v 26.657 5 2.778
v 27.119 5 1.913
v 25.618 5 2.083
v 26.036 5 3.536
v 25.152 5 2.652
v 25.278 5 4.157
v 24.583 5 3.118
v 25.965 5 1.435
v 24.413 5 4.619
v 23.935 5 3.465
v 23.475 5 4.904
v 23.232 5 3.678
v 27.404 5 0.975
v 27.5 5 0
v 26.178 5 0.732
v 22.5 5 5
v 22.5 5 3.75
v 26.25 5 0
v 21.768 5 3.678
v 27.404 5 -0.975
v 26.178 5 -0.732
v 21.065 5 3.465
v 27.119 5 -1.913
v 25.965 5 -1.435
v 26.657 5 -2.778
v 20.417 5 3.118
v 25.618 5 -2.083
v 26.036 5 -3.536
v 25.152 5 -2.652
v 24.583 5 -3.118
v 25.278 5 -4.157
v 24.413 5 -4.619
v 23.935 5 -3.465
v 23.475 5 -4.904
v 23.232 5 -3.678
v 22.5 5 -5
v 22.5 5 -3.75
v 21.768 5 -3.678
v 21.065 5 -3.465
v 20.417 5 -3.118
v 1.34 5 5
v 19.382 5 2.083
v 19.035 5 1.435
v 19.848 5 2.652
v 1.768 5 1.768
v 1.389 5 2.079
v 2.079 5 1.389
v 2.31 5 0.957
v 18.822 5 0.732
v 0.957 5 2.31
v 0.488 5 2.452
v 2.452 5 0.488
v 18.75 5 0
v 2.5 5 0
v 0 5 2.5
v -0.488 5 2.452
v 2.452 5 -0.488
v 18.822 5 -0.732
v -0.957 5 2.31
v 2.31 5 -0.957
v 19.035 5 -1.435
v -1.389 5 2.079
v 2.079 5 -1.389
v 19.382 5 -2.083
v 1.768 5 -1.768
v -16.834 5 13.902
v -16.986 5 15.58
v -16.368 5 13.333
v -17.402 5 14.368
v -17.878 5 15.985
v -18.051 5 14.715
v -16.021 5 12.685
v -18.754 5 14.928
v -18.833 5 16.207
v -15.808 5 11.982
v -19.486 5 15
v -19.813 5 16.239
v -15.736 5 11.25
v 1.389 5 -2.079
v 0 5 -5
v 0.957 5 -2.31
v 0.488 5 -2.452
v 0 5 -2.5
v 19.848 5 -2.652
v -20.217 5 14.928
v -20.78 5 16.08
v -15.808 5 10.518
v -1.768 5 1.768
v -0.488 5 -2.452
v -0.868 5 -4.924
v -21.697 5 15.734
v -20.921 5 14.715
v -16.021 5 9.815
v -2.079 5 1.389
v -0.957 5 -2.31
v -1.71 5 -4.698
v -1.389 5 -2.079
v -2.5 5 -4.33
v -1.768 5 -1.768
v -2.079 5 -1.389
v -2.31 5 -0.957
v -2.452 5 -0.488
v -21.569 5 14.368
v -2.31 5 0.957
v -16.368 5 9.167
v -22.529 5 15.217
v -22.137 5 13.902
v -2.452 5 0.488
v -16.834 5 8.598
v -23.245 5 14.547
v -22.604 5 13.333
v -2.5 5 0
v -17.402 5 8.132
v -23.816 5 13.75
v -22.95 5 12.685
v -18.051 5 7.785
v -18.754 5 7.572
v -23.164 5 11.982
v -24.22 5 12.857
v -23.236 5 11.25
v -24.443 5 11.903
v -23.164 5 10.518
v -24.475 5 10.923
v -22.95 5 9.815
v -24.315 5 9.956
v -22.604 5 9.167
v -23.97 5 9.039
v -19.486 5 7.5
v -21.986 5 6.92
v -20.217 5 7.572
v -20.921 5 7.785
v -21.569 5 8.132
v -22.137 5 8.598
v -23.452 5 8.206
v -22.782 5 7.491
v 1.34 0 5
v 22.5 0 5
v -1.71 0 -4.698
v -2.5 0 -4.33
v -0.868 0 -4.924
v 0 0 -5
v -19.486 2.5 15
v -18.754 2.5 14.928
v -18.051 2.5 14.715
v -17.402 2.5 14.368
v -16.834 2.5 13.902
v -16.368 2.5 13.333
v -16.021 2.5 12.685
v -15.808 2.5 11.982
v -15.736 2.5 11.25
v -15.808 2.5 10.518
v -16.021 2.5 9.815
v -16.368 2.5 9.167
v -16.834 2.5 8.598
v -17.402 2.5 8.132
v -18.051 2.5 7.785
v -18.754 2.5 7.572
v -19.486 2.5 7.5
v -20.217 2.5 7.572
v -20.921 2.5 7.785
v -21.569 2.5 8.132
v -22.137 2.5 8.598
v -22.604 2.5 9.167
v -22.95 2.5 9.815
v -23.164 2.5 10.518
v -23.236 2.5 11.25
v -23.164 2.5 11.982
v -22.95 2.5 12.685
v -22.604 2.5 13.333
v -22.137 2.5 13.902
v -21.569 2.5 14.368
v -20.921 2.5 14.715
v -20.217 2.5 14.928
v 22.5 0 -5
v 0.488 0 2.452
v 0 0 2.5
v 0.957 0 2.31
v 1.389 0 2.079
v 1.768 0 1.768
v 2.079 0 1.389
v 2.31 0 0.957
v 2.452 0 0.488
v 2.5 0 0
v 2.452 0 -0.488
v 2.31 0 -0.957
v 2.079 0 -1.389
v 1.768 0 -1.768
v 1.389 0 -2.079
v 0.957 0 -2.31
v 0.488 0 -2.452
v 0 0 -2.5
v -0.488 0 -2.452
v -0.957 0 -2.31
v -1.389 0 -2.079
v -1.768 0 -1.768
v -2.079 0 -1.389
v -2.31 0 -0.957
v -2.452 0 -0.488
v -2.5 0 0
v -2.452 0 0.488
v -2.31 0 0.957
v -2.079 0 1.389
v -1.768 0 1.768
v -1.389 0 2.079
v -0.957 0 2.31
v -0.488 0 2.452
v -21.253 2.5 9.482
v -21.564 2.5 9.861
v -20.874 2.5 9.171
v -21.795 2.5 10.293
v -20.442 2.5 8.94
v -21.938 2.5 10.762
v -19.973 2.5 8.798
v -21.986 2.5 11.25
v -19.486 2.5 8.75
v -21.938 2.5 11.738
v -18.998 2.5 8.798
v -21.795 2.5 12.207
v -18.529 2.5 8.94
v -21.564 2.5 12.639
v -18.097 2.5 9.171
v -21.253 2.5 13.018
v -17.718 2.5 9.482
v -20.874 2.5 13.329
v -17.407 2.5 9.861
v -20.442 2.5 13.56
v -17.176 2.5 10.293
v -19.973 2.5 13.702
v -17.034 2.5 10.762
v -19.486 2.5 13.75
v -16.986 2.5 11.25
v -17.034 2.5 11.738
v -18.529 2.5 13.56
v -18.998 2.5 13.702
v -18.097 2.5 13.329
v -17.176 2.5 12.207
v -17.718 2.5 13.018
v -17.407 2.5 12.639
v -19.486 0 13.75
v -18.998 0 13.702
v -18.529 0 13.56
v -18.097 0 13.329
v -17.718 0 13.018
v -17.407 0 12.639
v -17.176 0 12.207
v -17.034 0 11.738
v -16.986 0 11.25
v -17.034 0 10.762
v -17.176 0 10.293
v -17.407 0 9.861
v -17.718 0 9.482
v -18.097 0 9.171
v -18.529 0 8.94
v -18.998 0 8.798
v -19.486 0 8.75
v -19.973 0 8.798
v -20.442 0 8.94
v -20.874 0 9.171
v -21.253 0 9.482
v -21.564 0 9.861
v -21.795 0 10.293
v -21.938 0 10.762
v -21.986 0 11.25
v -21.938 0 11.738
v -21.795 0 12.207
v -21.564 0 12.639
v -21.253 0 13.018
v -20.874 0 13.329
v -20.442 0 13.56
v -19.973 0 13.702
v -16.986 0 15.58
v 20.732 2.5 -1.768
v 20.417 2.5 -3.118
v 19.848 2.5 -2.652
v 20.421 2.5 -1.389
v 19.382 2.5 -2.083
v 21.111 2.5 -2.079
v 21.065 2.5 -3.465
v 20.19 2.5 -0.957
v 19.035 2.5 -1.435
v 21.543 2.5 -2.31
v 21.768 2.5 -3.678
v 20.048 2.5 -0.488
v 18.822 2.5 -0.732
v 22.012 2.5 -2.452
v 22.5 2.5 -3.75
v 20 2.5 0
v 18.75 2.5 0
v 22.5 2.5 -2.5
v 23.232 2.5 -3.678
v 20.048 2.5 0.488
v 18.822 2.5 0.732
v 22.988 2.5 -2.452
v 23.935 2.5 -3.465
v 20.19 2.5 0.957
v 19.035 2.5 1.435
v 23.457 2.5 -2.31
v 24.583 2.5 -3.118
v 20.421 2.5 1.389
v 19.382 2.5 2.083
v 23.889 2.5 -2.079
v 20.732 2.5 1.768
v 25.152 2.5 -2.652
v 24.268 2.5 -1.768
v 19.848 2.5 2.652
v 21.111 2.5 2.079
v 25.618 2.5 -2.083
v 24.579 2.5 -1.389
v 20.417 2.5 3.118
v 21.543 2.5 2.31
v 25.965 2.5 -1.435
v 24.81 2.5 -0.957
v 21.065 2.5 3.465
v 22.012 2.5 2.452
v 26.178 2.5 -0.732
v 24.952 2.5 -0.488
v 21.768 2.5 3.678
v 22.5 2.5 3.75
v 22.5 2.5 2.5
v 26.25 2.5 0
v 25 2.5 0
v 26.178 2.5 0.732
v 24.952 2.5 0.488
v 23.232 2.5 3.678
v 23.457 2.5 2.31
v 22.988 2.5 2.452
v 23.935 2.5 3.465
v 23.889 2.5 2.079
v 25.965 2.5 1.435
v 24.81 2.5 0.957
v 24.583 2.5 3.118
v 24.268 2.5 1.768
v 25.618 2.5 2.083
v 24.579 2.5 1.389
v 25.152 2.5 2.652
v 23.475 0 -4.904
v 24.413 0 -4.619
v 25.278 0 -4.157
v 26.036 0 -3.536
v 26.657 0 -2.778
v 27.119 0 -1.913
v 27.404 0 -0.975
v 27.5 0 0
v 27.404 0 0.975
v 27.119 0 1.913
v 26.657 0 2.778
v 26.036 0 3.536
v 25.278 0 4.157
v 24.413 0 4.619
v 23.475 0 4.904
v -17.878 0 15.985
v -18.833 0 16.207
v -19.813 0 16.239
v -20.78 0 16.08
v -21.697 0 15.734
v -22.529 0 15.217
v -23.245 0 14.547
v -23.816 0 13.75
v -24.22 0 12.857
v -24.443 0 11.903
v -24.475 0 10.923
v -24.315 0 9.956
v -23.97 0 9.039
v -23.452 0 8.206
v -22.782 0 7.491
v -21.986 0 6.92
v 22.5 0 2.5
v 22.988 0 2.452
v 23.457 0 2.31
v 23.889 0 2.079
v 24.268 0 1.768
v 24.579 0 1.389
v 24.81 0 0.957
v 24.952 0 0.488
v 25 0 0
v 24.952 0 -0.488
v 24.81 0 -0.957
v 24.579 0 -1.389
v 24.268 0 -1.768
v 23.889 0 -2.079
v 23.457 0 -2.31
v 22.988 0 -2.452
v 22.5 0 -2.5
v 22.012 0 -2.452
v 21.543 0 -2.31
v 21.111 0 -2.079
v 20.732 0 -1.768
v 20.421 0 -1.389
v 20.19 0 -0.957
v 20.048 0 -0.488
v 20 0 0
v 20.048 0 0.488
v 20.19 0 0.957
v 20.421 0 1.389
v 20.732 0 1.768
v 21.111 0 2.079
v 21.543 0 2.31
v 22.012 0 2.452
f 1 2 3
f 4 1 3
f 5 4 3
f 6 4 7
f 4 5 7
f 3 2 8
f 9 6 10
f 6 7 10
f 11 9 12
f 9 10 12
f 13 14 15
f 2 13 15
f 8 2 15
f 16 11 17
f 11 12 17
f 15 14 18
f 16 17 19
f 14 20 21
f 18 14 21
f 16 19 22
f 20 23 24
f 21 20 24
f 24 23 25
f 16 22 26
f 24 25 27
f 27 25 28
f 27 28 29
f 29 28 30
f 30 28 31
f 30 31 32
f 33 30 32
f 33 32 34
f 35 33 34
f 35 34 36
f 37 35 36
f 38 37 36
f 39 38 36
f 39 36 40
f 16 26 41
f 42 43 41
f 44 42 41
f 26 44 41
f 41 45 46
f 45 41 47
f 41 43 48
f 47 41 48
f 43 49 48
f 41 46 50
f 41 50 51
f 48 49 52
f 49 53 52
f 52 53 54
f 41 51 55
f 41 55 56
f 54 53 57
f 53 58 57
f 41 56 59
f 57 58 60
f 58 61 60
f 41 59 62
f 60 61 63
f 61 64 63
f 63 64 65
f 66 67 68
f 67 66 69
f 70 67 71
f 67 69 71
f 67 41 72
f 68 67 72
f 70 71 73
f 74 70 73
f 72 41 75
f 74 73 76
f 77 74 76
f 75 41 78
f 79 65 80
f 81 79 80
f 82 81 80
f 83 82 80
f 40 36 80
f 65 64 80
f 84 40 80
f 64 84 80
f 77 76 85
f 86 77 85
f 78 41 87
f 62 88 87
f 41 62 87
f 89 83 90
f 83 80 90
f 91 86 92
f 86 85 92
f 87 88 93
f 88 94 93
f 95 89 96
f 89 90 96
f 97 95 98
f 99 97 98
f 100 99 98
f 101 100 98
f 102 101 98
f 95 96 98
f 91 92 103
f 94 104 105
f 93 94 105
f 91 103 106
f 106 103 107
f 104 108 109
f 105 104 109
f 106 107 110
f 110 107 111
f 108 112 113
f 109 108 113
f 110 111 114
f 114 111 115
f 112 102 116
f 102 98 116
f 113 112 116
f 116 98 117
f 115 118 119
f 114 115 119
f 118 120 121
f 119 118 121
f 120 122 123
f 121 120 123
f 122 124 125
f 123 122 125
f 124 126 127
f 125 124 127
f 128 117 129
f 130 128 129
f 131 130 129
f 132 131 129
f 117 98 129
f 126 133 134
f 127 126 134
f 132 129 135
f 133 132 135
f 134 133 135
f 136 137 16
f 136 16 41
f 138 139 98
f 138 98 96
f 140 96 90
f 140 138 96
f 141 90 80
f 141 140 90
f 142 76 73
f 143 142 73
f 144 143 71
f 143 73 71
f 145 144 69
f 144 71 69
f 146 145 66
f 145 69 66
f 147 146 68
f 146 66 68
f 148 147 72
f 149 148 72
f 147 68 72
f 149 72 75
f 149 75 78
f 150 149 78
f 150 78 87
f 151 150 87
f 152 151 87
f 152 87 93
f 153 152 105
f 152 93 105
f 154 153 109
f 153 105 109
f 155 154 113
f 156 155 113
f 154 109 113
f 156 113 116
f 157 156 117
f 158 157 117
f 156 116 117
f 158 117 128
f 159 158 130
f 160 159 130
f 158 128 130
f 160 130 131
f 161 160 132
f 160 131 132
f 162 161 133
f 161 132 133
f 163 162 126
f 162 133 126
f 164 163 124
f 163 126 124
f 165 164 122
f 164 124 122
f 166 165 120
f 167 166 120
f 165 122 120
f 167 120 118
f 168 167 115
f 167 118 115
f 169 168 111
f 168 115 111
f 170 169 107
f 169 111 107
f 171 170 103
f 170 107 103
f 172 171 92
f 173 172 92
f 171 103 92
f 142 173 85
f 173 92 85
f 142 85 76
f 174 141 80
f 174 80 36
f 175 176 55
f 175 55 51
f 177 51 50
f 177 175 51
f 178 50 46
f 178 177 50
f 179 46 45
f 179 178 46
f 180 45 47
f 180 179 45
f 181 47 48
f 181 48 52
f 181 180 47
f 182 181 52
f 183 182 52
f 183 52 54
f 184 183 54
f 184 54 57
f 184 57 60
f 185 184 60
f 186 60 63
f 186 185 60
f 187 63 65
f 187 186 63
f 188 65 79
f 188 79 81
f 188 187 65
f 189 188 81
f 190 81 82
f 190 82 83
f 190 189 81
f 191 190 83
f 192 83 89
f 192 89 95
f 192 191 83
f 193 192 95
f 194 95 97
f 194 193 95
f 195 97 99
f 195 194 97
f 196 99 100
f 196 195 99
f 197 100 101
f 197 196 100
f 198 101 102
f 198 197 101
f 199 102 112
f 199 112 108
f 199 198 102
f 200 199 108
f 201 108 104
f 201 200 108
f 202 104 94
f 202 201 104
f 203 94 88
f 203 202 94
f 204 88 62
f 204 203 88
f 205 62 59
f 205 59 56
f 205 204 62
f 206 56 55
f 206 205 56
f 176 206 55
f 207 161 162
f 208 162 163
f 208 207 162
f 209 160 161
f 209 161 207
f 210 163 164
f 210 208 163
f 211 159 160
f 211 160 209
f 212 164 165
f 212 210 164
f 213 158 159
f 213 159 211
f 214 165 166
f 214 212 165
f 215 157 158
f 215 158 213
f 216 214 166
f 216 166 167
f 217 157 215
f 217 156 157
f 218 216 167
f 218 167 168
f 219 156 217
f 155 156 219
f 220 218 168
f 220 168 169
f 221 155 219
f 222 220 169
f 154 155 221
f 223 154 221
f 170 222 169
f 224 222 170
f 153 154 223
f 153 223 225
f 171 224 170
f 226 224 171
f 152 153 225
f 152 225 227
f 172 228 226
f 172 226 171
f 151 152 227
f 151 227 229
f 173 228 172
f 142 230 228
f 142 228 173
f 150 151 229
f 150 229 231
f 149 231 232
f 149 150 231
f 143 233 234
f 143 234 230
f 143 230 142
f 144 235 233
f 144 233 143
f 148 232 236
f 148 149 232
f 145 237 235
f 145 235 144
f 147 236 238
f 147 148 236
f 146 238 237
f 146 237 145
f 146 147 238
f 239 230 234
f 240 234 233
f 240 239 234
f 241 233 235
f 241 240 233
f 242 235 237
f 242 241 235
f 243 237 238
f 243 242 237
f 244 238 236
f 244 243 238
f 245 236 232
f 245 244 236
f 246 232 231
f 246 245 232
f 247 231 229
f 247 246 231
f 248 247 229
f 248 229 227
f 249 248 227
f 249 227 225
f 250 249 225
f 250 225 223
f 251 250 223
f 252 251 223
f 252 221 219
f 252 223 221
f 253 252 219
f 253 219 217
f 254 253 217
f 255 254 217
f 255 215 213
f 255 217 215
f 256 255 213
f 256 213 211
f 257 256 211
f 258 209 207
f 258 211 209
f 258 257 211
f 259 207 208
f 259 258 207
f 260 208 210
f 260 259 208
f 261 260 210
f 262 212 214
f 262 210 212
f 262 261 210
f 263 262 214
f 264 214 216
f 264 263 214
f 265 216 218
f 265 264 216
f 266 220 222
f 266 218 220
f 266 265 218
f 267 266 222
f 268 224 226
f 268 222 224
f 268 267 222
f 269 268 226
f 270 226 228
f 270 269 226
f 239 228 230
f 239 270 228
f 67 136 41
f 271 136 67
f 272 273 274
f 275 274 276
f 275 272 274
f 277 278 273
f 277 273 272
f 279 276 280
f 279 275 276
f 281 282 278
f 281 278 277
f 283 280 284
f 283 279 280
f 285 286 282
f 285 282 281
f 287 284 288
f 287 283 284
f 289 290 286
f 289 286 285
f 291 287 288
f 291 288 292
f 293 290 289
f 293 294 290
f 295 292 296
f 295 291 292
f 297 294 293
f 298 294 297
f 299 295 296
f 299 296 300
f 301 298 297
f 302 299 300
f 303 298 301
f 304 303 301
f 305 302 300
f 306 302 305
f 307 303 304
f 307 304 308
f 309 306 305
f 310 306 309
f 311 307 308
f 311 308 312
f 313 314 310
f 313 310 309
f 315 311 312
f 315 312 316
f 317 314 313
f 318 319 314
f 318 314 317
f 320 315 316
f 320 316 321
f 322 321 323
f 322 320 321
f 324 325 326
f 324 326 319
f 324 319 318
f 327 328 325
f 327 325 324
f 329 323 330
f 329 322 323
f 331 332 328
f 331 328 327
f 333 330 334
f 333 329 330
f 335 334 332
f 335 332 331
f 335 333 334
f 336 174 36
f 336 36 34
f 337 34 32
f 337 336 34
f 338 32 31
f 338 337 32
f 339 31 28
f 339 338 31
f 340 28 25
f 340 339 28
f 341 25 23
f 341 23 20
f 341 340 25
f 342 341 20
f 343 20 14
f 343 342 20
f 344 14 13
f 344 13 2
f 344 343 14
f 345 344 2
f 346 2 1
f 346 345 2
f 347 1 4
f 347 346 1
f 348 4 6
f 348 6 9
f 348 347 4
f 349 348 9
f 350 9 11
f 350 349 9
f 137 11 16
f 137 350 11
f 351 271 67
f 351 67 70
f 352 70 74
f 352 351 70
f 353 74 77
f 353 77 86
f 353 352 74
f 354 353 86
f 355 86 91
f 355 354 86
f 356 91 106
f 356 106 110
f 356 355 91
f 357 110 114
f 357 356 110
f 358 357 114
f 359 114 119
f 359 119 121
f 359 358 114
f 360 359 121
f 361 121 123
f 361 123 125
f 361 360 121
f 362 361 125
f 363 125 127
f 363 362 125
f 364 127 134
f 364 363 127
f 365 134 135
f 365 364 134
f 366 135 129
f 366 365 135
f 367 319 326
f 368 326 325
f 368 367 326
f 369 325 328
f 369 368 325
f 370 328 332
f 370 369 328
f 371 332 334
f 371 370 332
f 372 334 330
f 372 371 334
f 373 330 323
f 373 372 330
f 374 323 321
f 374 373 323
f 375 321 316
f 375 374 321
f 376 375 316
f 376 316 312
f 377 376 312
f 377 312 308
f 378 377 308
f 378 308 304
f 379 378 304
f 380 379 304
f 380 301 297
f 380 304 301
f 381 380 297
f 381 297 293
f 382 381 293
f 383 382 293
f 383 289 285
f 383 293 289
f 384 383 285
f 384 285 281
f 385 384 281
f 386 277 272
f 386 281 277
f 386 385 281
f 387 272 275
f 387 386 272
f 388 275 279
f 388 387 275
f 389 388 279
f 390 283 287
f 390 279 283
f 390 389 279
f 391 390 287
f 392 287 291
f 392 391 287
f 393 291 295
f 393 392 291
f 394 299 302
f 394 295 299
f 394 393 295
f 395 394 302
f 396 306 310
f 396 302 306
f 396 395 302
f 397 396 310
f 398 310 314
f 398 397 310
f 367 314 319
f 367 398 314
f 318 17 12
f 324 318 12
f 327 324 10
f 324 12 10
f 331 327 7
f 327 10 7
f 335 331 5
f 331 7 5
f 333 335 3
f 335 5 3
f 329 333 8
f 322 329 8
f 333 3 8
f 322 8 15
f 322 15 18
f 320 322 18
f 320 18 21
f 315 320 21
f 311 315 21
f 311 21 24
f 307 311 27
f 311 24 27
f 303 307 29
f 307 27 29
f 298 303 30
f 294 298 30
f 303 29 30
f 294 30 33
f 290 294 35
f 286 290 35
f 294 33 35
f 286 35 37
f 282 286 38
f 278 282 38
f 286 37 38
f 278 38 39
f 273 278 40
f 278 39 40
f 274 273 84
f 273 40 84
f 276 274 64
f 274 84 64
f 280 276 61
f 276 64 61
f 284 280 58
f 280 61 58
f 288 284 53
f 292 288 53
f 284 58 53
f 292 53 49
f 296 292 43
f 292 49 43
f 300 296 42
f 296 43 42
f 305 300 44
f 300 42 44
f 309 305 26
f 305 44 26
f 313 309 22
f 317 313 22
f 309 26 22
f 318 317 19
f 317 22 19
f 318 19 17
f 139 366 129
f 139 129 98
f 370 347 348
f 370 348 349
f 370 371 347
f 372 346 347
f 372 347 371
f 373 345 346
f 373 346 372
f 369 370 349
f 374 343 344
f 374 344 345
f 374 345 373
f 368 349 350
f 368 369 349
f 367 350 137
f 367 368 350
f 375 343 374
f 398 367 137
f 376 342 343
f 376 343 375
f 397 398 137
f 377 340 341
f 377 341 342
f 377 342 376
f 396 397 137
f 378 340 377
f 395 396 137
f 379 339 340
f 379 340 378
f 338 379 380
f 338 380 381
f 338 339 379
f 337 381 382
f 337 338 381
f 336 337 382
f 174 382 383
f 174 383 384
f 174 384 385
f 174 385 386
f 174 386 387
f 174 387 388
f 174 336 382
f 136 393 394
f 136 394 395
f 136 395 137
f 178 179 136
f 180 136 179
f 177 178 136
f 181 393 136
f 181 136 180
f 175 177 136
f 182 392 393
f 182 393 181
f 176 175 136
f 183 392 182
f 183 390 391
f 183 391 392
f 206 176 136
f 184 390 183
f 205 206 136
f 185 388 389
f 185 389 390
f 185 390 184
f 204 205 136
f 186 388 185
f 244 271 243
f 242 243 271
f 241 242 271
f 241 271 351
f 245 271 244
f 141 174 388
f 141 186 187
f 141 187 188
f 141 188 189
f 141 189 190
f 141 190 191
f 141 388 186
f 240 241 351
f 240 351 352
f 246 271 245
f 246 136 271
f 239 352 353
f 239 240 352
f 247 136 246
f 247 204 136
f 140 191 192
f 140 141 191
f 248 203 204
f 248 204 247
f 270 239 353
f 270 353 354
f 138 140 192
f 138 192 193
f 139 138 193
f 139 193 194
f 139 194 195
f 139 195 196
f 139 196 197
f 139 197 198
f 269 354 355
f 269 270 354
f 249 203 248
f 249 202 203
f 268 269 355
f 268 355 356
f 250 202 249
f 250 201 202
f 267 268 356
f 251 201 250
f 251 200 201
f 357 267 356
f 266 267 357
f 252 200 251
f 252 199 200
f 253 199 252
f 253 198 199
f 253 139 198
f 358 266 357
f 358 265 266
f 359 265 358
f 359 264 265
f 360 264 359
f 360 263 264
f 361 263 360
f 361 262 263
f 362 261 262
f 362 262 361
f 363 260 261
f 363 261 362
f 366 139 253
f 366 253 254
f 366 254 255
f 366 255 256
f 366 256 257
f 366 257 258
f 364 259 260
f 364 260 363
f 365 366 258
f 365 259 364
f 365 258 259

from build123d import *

# Parameters (mm, degrees)
SKETCH1_R           = 2.5
BOSS_EXTRUDE1_DEPTH = 5
BOSS_EXTRUDE2_START = -5
SKETCH2_R           = 2.5
BOSS_EXTRUDE2_DEPTH = 5
SKETCH3_R           = 3.75
CUT_EXTRUDE1_DEPTH  = 2.5


with BuildPart() as part:
    # Sketch1 → Boss-Extrude1 (new body)
    with BuildSketch(Plane(origin=(0, 0, 0), x_dir=(1, 0, 0), z_dir=(0, 1, 0))):
        with BuildLine():
            Line((0, 5), (22.5, 5))
            ThreePointArc((22.5, 5), (27.5, 0), (22.5, -5))
            Line((22.5, -5), (0, -5))
            ThreePointArc((0, -5), (-5, 0), (0, 5))
        make_face()
        with Locations(Location((0, 0, 0), (0, 0, 270))):
            Circle(SKETCH1_R, mode=Mode.SUBTRACT)
        with Locations(Location((22.5, 0, 0), (0, 0, 270))):
            Circle(SKETCH1_R, mode=Mode.SUBTRACT)
    extrude(amount=BOSS_EXTRUDE1_DEPTH)

    # Sketch2 → Boss-Extrude2 (add)
    with BuildSketch(Plane(origin=(0, 5, 0), x_dir=(1, 0, 0), z_dir=(0, 1, 0)).offset(BOSS_EXTRUDE2_START)):
        with BuildLine():
            Line((2.5, -4.330127019), (-16.985571585, -15.580127019))
            ThreePointArc((-16.985571585, -15.580127019), (-23.815698604, -13.75), (-21.985571585, -6.919872981))
            Line((-21.985571585, -6.919872981), (-2.5, 4.330127019))
            ThreePointArc((-2.5, 4.330127019), (4.330127019, 2.5), (2.5, -4.330127019))
        make_face()
        with Locations(Location((-19.485571585, -11.25, 0), (0, 0, 270))):
            Circle(SKETCH2_R, mode=Mode.SUBTRACT)
        with Locations(Location((0, 0, 0), (0, 0, 270))):
            Circle(SKETCH2_R, mode=Mode.SUBTRACT)
    extrude(amount=BOSS_EXTRUDE2_DEPTH)

    # Sketch3 → Cut-Extrude1 (cut)
    with BuildSketch(Plane(origin=(0, 5, 0), x_dir=(1, 0, 0), z_dir=(0, 1, 0))):
        with Locations(Location((22.5, 0, 0), (0, 0, 270))):
            Circle(SKETCH3_R)
        with Locations(Location((-19.485571585, -11.25, 0), (0, 0, 270))):
            Circle(SKETCH3_R)
    extrude(amount=-CUT_EXTRUDE1_DEPTH, mode=Mode.SUBTRACT)


solid = part.part
